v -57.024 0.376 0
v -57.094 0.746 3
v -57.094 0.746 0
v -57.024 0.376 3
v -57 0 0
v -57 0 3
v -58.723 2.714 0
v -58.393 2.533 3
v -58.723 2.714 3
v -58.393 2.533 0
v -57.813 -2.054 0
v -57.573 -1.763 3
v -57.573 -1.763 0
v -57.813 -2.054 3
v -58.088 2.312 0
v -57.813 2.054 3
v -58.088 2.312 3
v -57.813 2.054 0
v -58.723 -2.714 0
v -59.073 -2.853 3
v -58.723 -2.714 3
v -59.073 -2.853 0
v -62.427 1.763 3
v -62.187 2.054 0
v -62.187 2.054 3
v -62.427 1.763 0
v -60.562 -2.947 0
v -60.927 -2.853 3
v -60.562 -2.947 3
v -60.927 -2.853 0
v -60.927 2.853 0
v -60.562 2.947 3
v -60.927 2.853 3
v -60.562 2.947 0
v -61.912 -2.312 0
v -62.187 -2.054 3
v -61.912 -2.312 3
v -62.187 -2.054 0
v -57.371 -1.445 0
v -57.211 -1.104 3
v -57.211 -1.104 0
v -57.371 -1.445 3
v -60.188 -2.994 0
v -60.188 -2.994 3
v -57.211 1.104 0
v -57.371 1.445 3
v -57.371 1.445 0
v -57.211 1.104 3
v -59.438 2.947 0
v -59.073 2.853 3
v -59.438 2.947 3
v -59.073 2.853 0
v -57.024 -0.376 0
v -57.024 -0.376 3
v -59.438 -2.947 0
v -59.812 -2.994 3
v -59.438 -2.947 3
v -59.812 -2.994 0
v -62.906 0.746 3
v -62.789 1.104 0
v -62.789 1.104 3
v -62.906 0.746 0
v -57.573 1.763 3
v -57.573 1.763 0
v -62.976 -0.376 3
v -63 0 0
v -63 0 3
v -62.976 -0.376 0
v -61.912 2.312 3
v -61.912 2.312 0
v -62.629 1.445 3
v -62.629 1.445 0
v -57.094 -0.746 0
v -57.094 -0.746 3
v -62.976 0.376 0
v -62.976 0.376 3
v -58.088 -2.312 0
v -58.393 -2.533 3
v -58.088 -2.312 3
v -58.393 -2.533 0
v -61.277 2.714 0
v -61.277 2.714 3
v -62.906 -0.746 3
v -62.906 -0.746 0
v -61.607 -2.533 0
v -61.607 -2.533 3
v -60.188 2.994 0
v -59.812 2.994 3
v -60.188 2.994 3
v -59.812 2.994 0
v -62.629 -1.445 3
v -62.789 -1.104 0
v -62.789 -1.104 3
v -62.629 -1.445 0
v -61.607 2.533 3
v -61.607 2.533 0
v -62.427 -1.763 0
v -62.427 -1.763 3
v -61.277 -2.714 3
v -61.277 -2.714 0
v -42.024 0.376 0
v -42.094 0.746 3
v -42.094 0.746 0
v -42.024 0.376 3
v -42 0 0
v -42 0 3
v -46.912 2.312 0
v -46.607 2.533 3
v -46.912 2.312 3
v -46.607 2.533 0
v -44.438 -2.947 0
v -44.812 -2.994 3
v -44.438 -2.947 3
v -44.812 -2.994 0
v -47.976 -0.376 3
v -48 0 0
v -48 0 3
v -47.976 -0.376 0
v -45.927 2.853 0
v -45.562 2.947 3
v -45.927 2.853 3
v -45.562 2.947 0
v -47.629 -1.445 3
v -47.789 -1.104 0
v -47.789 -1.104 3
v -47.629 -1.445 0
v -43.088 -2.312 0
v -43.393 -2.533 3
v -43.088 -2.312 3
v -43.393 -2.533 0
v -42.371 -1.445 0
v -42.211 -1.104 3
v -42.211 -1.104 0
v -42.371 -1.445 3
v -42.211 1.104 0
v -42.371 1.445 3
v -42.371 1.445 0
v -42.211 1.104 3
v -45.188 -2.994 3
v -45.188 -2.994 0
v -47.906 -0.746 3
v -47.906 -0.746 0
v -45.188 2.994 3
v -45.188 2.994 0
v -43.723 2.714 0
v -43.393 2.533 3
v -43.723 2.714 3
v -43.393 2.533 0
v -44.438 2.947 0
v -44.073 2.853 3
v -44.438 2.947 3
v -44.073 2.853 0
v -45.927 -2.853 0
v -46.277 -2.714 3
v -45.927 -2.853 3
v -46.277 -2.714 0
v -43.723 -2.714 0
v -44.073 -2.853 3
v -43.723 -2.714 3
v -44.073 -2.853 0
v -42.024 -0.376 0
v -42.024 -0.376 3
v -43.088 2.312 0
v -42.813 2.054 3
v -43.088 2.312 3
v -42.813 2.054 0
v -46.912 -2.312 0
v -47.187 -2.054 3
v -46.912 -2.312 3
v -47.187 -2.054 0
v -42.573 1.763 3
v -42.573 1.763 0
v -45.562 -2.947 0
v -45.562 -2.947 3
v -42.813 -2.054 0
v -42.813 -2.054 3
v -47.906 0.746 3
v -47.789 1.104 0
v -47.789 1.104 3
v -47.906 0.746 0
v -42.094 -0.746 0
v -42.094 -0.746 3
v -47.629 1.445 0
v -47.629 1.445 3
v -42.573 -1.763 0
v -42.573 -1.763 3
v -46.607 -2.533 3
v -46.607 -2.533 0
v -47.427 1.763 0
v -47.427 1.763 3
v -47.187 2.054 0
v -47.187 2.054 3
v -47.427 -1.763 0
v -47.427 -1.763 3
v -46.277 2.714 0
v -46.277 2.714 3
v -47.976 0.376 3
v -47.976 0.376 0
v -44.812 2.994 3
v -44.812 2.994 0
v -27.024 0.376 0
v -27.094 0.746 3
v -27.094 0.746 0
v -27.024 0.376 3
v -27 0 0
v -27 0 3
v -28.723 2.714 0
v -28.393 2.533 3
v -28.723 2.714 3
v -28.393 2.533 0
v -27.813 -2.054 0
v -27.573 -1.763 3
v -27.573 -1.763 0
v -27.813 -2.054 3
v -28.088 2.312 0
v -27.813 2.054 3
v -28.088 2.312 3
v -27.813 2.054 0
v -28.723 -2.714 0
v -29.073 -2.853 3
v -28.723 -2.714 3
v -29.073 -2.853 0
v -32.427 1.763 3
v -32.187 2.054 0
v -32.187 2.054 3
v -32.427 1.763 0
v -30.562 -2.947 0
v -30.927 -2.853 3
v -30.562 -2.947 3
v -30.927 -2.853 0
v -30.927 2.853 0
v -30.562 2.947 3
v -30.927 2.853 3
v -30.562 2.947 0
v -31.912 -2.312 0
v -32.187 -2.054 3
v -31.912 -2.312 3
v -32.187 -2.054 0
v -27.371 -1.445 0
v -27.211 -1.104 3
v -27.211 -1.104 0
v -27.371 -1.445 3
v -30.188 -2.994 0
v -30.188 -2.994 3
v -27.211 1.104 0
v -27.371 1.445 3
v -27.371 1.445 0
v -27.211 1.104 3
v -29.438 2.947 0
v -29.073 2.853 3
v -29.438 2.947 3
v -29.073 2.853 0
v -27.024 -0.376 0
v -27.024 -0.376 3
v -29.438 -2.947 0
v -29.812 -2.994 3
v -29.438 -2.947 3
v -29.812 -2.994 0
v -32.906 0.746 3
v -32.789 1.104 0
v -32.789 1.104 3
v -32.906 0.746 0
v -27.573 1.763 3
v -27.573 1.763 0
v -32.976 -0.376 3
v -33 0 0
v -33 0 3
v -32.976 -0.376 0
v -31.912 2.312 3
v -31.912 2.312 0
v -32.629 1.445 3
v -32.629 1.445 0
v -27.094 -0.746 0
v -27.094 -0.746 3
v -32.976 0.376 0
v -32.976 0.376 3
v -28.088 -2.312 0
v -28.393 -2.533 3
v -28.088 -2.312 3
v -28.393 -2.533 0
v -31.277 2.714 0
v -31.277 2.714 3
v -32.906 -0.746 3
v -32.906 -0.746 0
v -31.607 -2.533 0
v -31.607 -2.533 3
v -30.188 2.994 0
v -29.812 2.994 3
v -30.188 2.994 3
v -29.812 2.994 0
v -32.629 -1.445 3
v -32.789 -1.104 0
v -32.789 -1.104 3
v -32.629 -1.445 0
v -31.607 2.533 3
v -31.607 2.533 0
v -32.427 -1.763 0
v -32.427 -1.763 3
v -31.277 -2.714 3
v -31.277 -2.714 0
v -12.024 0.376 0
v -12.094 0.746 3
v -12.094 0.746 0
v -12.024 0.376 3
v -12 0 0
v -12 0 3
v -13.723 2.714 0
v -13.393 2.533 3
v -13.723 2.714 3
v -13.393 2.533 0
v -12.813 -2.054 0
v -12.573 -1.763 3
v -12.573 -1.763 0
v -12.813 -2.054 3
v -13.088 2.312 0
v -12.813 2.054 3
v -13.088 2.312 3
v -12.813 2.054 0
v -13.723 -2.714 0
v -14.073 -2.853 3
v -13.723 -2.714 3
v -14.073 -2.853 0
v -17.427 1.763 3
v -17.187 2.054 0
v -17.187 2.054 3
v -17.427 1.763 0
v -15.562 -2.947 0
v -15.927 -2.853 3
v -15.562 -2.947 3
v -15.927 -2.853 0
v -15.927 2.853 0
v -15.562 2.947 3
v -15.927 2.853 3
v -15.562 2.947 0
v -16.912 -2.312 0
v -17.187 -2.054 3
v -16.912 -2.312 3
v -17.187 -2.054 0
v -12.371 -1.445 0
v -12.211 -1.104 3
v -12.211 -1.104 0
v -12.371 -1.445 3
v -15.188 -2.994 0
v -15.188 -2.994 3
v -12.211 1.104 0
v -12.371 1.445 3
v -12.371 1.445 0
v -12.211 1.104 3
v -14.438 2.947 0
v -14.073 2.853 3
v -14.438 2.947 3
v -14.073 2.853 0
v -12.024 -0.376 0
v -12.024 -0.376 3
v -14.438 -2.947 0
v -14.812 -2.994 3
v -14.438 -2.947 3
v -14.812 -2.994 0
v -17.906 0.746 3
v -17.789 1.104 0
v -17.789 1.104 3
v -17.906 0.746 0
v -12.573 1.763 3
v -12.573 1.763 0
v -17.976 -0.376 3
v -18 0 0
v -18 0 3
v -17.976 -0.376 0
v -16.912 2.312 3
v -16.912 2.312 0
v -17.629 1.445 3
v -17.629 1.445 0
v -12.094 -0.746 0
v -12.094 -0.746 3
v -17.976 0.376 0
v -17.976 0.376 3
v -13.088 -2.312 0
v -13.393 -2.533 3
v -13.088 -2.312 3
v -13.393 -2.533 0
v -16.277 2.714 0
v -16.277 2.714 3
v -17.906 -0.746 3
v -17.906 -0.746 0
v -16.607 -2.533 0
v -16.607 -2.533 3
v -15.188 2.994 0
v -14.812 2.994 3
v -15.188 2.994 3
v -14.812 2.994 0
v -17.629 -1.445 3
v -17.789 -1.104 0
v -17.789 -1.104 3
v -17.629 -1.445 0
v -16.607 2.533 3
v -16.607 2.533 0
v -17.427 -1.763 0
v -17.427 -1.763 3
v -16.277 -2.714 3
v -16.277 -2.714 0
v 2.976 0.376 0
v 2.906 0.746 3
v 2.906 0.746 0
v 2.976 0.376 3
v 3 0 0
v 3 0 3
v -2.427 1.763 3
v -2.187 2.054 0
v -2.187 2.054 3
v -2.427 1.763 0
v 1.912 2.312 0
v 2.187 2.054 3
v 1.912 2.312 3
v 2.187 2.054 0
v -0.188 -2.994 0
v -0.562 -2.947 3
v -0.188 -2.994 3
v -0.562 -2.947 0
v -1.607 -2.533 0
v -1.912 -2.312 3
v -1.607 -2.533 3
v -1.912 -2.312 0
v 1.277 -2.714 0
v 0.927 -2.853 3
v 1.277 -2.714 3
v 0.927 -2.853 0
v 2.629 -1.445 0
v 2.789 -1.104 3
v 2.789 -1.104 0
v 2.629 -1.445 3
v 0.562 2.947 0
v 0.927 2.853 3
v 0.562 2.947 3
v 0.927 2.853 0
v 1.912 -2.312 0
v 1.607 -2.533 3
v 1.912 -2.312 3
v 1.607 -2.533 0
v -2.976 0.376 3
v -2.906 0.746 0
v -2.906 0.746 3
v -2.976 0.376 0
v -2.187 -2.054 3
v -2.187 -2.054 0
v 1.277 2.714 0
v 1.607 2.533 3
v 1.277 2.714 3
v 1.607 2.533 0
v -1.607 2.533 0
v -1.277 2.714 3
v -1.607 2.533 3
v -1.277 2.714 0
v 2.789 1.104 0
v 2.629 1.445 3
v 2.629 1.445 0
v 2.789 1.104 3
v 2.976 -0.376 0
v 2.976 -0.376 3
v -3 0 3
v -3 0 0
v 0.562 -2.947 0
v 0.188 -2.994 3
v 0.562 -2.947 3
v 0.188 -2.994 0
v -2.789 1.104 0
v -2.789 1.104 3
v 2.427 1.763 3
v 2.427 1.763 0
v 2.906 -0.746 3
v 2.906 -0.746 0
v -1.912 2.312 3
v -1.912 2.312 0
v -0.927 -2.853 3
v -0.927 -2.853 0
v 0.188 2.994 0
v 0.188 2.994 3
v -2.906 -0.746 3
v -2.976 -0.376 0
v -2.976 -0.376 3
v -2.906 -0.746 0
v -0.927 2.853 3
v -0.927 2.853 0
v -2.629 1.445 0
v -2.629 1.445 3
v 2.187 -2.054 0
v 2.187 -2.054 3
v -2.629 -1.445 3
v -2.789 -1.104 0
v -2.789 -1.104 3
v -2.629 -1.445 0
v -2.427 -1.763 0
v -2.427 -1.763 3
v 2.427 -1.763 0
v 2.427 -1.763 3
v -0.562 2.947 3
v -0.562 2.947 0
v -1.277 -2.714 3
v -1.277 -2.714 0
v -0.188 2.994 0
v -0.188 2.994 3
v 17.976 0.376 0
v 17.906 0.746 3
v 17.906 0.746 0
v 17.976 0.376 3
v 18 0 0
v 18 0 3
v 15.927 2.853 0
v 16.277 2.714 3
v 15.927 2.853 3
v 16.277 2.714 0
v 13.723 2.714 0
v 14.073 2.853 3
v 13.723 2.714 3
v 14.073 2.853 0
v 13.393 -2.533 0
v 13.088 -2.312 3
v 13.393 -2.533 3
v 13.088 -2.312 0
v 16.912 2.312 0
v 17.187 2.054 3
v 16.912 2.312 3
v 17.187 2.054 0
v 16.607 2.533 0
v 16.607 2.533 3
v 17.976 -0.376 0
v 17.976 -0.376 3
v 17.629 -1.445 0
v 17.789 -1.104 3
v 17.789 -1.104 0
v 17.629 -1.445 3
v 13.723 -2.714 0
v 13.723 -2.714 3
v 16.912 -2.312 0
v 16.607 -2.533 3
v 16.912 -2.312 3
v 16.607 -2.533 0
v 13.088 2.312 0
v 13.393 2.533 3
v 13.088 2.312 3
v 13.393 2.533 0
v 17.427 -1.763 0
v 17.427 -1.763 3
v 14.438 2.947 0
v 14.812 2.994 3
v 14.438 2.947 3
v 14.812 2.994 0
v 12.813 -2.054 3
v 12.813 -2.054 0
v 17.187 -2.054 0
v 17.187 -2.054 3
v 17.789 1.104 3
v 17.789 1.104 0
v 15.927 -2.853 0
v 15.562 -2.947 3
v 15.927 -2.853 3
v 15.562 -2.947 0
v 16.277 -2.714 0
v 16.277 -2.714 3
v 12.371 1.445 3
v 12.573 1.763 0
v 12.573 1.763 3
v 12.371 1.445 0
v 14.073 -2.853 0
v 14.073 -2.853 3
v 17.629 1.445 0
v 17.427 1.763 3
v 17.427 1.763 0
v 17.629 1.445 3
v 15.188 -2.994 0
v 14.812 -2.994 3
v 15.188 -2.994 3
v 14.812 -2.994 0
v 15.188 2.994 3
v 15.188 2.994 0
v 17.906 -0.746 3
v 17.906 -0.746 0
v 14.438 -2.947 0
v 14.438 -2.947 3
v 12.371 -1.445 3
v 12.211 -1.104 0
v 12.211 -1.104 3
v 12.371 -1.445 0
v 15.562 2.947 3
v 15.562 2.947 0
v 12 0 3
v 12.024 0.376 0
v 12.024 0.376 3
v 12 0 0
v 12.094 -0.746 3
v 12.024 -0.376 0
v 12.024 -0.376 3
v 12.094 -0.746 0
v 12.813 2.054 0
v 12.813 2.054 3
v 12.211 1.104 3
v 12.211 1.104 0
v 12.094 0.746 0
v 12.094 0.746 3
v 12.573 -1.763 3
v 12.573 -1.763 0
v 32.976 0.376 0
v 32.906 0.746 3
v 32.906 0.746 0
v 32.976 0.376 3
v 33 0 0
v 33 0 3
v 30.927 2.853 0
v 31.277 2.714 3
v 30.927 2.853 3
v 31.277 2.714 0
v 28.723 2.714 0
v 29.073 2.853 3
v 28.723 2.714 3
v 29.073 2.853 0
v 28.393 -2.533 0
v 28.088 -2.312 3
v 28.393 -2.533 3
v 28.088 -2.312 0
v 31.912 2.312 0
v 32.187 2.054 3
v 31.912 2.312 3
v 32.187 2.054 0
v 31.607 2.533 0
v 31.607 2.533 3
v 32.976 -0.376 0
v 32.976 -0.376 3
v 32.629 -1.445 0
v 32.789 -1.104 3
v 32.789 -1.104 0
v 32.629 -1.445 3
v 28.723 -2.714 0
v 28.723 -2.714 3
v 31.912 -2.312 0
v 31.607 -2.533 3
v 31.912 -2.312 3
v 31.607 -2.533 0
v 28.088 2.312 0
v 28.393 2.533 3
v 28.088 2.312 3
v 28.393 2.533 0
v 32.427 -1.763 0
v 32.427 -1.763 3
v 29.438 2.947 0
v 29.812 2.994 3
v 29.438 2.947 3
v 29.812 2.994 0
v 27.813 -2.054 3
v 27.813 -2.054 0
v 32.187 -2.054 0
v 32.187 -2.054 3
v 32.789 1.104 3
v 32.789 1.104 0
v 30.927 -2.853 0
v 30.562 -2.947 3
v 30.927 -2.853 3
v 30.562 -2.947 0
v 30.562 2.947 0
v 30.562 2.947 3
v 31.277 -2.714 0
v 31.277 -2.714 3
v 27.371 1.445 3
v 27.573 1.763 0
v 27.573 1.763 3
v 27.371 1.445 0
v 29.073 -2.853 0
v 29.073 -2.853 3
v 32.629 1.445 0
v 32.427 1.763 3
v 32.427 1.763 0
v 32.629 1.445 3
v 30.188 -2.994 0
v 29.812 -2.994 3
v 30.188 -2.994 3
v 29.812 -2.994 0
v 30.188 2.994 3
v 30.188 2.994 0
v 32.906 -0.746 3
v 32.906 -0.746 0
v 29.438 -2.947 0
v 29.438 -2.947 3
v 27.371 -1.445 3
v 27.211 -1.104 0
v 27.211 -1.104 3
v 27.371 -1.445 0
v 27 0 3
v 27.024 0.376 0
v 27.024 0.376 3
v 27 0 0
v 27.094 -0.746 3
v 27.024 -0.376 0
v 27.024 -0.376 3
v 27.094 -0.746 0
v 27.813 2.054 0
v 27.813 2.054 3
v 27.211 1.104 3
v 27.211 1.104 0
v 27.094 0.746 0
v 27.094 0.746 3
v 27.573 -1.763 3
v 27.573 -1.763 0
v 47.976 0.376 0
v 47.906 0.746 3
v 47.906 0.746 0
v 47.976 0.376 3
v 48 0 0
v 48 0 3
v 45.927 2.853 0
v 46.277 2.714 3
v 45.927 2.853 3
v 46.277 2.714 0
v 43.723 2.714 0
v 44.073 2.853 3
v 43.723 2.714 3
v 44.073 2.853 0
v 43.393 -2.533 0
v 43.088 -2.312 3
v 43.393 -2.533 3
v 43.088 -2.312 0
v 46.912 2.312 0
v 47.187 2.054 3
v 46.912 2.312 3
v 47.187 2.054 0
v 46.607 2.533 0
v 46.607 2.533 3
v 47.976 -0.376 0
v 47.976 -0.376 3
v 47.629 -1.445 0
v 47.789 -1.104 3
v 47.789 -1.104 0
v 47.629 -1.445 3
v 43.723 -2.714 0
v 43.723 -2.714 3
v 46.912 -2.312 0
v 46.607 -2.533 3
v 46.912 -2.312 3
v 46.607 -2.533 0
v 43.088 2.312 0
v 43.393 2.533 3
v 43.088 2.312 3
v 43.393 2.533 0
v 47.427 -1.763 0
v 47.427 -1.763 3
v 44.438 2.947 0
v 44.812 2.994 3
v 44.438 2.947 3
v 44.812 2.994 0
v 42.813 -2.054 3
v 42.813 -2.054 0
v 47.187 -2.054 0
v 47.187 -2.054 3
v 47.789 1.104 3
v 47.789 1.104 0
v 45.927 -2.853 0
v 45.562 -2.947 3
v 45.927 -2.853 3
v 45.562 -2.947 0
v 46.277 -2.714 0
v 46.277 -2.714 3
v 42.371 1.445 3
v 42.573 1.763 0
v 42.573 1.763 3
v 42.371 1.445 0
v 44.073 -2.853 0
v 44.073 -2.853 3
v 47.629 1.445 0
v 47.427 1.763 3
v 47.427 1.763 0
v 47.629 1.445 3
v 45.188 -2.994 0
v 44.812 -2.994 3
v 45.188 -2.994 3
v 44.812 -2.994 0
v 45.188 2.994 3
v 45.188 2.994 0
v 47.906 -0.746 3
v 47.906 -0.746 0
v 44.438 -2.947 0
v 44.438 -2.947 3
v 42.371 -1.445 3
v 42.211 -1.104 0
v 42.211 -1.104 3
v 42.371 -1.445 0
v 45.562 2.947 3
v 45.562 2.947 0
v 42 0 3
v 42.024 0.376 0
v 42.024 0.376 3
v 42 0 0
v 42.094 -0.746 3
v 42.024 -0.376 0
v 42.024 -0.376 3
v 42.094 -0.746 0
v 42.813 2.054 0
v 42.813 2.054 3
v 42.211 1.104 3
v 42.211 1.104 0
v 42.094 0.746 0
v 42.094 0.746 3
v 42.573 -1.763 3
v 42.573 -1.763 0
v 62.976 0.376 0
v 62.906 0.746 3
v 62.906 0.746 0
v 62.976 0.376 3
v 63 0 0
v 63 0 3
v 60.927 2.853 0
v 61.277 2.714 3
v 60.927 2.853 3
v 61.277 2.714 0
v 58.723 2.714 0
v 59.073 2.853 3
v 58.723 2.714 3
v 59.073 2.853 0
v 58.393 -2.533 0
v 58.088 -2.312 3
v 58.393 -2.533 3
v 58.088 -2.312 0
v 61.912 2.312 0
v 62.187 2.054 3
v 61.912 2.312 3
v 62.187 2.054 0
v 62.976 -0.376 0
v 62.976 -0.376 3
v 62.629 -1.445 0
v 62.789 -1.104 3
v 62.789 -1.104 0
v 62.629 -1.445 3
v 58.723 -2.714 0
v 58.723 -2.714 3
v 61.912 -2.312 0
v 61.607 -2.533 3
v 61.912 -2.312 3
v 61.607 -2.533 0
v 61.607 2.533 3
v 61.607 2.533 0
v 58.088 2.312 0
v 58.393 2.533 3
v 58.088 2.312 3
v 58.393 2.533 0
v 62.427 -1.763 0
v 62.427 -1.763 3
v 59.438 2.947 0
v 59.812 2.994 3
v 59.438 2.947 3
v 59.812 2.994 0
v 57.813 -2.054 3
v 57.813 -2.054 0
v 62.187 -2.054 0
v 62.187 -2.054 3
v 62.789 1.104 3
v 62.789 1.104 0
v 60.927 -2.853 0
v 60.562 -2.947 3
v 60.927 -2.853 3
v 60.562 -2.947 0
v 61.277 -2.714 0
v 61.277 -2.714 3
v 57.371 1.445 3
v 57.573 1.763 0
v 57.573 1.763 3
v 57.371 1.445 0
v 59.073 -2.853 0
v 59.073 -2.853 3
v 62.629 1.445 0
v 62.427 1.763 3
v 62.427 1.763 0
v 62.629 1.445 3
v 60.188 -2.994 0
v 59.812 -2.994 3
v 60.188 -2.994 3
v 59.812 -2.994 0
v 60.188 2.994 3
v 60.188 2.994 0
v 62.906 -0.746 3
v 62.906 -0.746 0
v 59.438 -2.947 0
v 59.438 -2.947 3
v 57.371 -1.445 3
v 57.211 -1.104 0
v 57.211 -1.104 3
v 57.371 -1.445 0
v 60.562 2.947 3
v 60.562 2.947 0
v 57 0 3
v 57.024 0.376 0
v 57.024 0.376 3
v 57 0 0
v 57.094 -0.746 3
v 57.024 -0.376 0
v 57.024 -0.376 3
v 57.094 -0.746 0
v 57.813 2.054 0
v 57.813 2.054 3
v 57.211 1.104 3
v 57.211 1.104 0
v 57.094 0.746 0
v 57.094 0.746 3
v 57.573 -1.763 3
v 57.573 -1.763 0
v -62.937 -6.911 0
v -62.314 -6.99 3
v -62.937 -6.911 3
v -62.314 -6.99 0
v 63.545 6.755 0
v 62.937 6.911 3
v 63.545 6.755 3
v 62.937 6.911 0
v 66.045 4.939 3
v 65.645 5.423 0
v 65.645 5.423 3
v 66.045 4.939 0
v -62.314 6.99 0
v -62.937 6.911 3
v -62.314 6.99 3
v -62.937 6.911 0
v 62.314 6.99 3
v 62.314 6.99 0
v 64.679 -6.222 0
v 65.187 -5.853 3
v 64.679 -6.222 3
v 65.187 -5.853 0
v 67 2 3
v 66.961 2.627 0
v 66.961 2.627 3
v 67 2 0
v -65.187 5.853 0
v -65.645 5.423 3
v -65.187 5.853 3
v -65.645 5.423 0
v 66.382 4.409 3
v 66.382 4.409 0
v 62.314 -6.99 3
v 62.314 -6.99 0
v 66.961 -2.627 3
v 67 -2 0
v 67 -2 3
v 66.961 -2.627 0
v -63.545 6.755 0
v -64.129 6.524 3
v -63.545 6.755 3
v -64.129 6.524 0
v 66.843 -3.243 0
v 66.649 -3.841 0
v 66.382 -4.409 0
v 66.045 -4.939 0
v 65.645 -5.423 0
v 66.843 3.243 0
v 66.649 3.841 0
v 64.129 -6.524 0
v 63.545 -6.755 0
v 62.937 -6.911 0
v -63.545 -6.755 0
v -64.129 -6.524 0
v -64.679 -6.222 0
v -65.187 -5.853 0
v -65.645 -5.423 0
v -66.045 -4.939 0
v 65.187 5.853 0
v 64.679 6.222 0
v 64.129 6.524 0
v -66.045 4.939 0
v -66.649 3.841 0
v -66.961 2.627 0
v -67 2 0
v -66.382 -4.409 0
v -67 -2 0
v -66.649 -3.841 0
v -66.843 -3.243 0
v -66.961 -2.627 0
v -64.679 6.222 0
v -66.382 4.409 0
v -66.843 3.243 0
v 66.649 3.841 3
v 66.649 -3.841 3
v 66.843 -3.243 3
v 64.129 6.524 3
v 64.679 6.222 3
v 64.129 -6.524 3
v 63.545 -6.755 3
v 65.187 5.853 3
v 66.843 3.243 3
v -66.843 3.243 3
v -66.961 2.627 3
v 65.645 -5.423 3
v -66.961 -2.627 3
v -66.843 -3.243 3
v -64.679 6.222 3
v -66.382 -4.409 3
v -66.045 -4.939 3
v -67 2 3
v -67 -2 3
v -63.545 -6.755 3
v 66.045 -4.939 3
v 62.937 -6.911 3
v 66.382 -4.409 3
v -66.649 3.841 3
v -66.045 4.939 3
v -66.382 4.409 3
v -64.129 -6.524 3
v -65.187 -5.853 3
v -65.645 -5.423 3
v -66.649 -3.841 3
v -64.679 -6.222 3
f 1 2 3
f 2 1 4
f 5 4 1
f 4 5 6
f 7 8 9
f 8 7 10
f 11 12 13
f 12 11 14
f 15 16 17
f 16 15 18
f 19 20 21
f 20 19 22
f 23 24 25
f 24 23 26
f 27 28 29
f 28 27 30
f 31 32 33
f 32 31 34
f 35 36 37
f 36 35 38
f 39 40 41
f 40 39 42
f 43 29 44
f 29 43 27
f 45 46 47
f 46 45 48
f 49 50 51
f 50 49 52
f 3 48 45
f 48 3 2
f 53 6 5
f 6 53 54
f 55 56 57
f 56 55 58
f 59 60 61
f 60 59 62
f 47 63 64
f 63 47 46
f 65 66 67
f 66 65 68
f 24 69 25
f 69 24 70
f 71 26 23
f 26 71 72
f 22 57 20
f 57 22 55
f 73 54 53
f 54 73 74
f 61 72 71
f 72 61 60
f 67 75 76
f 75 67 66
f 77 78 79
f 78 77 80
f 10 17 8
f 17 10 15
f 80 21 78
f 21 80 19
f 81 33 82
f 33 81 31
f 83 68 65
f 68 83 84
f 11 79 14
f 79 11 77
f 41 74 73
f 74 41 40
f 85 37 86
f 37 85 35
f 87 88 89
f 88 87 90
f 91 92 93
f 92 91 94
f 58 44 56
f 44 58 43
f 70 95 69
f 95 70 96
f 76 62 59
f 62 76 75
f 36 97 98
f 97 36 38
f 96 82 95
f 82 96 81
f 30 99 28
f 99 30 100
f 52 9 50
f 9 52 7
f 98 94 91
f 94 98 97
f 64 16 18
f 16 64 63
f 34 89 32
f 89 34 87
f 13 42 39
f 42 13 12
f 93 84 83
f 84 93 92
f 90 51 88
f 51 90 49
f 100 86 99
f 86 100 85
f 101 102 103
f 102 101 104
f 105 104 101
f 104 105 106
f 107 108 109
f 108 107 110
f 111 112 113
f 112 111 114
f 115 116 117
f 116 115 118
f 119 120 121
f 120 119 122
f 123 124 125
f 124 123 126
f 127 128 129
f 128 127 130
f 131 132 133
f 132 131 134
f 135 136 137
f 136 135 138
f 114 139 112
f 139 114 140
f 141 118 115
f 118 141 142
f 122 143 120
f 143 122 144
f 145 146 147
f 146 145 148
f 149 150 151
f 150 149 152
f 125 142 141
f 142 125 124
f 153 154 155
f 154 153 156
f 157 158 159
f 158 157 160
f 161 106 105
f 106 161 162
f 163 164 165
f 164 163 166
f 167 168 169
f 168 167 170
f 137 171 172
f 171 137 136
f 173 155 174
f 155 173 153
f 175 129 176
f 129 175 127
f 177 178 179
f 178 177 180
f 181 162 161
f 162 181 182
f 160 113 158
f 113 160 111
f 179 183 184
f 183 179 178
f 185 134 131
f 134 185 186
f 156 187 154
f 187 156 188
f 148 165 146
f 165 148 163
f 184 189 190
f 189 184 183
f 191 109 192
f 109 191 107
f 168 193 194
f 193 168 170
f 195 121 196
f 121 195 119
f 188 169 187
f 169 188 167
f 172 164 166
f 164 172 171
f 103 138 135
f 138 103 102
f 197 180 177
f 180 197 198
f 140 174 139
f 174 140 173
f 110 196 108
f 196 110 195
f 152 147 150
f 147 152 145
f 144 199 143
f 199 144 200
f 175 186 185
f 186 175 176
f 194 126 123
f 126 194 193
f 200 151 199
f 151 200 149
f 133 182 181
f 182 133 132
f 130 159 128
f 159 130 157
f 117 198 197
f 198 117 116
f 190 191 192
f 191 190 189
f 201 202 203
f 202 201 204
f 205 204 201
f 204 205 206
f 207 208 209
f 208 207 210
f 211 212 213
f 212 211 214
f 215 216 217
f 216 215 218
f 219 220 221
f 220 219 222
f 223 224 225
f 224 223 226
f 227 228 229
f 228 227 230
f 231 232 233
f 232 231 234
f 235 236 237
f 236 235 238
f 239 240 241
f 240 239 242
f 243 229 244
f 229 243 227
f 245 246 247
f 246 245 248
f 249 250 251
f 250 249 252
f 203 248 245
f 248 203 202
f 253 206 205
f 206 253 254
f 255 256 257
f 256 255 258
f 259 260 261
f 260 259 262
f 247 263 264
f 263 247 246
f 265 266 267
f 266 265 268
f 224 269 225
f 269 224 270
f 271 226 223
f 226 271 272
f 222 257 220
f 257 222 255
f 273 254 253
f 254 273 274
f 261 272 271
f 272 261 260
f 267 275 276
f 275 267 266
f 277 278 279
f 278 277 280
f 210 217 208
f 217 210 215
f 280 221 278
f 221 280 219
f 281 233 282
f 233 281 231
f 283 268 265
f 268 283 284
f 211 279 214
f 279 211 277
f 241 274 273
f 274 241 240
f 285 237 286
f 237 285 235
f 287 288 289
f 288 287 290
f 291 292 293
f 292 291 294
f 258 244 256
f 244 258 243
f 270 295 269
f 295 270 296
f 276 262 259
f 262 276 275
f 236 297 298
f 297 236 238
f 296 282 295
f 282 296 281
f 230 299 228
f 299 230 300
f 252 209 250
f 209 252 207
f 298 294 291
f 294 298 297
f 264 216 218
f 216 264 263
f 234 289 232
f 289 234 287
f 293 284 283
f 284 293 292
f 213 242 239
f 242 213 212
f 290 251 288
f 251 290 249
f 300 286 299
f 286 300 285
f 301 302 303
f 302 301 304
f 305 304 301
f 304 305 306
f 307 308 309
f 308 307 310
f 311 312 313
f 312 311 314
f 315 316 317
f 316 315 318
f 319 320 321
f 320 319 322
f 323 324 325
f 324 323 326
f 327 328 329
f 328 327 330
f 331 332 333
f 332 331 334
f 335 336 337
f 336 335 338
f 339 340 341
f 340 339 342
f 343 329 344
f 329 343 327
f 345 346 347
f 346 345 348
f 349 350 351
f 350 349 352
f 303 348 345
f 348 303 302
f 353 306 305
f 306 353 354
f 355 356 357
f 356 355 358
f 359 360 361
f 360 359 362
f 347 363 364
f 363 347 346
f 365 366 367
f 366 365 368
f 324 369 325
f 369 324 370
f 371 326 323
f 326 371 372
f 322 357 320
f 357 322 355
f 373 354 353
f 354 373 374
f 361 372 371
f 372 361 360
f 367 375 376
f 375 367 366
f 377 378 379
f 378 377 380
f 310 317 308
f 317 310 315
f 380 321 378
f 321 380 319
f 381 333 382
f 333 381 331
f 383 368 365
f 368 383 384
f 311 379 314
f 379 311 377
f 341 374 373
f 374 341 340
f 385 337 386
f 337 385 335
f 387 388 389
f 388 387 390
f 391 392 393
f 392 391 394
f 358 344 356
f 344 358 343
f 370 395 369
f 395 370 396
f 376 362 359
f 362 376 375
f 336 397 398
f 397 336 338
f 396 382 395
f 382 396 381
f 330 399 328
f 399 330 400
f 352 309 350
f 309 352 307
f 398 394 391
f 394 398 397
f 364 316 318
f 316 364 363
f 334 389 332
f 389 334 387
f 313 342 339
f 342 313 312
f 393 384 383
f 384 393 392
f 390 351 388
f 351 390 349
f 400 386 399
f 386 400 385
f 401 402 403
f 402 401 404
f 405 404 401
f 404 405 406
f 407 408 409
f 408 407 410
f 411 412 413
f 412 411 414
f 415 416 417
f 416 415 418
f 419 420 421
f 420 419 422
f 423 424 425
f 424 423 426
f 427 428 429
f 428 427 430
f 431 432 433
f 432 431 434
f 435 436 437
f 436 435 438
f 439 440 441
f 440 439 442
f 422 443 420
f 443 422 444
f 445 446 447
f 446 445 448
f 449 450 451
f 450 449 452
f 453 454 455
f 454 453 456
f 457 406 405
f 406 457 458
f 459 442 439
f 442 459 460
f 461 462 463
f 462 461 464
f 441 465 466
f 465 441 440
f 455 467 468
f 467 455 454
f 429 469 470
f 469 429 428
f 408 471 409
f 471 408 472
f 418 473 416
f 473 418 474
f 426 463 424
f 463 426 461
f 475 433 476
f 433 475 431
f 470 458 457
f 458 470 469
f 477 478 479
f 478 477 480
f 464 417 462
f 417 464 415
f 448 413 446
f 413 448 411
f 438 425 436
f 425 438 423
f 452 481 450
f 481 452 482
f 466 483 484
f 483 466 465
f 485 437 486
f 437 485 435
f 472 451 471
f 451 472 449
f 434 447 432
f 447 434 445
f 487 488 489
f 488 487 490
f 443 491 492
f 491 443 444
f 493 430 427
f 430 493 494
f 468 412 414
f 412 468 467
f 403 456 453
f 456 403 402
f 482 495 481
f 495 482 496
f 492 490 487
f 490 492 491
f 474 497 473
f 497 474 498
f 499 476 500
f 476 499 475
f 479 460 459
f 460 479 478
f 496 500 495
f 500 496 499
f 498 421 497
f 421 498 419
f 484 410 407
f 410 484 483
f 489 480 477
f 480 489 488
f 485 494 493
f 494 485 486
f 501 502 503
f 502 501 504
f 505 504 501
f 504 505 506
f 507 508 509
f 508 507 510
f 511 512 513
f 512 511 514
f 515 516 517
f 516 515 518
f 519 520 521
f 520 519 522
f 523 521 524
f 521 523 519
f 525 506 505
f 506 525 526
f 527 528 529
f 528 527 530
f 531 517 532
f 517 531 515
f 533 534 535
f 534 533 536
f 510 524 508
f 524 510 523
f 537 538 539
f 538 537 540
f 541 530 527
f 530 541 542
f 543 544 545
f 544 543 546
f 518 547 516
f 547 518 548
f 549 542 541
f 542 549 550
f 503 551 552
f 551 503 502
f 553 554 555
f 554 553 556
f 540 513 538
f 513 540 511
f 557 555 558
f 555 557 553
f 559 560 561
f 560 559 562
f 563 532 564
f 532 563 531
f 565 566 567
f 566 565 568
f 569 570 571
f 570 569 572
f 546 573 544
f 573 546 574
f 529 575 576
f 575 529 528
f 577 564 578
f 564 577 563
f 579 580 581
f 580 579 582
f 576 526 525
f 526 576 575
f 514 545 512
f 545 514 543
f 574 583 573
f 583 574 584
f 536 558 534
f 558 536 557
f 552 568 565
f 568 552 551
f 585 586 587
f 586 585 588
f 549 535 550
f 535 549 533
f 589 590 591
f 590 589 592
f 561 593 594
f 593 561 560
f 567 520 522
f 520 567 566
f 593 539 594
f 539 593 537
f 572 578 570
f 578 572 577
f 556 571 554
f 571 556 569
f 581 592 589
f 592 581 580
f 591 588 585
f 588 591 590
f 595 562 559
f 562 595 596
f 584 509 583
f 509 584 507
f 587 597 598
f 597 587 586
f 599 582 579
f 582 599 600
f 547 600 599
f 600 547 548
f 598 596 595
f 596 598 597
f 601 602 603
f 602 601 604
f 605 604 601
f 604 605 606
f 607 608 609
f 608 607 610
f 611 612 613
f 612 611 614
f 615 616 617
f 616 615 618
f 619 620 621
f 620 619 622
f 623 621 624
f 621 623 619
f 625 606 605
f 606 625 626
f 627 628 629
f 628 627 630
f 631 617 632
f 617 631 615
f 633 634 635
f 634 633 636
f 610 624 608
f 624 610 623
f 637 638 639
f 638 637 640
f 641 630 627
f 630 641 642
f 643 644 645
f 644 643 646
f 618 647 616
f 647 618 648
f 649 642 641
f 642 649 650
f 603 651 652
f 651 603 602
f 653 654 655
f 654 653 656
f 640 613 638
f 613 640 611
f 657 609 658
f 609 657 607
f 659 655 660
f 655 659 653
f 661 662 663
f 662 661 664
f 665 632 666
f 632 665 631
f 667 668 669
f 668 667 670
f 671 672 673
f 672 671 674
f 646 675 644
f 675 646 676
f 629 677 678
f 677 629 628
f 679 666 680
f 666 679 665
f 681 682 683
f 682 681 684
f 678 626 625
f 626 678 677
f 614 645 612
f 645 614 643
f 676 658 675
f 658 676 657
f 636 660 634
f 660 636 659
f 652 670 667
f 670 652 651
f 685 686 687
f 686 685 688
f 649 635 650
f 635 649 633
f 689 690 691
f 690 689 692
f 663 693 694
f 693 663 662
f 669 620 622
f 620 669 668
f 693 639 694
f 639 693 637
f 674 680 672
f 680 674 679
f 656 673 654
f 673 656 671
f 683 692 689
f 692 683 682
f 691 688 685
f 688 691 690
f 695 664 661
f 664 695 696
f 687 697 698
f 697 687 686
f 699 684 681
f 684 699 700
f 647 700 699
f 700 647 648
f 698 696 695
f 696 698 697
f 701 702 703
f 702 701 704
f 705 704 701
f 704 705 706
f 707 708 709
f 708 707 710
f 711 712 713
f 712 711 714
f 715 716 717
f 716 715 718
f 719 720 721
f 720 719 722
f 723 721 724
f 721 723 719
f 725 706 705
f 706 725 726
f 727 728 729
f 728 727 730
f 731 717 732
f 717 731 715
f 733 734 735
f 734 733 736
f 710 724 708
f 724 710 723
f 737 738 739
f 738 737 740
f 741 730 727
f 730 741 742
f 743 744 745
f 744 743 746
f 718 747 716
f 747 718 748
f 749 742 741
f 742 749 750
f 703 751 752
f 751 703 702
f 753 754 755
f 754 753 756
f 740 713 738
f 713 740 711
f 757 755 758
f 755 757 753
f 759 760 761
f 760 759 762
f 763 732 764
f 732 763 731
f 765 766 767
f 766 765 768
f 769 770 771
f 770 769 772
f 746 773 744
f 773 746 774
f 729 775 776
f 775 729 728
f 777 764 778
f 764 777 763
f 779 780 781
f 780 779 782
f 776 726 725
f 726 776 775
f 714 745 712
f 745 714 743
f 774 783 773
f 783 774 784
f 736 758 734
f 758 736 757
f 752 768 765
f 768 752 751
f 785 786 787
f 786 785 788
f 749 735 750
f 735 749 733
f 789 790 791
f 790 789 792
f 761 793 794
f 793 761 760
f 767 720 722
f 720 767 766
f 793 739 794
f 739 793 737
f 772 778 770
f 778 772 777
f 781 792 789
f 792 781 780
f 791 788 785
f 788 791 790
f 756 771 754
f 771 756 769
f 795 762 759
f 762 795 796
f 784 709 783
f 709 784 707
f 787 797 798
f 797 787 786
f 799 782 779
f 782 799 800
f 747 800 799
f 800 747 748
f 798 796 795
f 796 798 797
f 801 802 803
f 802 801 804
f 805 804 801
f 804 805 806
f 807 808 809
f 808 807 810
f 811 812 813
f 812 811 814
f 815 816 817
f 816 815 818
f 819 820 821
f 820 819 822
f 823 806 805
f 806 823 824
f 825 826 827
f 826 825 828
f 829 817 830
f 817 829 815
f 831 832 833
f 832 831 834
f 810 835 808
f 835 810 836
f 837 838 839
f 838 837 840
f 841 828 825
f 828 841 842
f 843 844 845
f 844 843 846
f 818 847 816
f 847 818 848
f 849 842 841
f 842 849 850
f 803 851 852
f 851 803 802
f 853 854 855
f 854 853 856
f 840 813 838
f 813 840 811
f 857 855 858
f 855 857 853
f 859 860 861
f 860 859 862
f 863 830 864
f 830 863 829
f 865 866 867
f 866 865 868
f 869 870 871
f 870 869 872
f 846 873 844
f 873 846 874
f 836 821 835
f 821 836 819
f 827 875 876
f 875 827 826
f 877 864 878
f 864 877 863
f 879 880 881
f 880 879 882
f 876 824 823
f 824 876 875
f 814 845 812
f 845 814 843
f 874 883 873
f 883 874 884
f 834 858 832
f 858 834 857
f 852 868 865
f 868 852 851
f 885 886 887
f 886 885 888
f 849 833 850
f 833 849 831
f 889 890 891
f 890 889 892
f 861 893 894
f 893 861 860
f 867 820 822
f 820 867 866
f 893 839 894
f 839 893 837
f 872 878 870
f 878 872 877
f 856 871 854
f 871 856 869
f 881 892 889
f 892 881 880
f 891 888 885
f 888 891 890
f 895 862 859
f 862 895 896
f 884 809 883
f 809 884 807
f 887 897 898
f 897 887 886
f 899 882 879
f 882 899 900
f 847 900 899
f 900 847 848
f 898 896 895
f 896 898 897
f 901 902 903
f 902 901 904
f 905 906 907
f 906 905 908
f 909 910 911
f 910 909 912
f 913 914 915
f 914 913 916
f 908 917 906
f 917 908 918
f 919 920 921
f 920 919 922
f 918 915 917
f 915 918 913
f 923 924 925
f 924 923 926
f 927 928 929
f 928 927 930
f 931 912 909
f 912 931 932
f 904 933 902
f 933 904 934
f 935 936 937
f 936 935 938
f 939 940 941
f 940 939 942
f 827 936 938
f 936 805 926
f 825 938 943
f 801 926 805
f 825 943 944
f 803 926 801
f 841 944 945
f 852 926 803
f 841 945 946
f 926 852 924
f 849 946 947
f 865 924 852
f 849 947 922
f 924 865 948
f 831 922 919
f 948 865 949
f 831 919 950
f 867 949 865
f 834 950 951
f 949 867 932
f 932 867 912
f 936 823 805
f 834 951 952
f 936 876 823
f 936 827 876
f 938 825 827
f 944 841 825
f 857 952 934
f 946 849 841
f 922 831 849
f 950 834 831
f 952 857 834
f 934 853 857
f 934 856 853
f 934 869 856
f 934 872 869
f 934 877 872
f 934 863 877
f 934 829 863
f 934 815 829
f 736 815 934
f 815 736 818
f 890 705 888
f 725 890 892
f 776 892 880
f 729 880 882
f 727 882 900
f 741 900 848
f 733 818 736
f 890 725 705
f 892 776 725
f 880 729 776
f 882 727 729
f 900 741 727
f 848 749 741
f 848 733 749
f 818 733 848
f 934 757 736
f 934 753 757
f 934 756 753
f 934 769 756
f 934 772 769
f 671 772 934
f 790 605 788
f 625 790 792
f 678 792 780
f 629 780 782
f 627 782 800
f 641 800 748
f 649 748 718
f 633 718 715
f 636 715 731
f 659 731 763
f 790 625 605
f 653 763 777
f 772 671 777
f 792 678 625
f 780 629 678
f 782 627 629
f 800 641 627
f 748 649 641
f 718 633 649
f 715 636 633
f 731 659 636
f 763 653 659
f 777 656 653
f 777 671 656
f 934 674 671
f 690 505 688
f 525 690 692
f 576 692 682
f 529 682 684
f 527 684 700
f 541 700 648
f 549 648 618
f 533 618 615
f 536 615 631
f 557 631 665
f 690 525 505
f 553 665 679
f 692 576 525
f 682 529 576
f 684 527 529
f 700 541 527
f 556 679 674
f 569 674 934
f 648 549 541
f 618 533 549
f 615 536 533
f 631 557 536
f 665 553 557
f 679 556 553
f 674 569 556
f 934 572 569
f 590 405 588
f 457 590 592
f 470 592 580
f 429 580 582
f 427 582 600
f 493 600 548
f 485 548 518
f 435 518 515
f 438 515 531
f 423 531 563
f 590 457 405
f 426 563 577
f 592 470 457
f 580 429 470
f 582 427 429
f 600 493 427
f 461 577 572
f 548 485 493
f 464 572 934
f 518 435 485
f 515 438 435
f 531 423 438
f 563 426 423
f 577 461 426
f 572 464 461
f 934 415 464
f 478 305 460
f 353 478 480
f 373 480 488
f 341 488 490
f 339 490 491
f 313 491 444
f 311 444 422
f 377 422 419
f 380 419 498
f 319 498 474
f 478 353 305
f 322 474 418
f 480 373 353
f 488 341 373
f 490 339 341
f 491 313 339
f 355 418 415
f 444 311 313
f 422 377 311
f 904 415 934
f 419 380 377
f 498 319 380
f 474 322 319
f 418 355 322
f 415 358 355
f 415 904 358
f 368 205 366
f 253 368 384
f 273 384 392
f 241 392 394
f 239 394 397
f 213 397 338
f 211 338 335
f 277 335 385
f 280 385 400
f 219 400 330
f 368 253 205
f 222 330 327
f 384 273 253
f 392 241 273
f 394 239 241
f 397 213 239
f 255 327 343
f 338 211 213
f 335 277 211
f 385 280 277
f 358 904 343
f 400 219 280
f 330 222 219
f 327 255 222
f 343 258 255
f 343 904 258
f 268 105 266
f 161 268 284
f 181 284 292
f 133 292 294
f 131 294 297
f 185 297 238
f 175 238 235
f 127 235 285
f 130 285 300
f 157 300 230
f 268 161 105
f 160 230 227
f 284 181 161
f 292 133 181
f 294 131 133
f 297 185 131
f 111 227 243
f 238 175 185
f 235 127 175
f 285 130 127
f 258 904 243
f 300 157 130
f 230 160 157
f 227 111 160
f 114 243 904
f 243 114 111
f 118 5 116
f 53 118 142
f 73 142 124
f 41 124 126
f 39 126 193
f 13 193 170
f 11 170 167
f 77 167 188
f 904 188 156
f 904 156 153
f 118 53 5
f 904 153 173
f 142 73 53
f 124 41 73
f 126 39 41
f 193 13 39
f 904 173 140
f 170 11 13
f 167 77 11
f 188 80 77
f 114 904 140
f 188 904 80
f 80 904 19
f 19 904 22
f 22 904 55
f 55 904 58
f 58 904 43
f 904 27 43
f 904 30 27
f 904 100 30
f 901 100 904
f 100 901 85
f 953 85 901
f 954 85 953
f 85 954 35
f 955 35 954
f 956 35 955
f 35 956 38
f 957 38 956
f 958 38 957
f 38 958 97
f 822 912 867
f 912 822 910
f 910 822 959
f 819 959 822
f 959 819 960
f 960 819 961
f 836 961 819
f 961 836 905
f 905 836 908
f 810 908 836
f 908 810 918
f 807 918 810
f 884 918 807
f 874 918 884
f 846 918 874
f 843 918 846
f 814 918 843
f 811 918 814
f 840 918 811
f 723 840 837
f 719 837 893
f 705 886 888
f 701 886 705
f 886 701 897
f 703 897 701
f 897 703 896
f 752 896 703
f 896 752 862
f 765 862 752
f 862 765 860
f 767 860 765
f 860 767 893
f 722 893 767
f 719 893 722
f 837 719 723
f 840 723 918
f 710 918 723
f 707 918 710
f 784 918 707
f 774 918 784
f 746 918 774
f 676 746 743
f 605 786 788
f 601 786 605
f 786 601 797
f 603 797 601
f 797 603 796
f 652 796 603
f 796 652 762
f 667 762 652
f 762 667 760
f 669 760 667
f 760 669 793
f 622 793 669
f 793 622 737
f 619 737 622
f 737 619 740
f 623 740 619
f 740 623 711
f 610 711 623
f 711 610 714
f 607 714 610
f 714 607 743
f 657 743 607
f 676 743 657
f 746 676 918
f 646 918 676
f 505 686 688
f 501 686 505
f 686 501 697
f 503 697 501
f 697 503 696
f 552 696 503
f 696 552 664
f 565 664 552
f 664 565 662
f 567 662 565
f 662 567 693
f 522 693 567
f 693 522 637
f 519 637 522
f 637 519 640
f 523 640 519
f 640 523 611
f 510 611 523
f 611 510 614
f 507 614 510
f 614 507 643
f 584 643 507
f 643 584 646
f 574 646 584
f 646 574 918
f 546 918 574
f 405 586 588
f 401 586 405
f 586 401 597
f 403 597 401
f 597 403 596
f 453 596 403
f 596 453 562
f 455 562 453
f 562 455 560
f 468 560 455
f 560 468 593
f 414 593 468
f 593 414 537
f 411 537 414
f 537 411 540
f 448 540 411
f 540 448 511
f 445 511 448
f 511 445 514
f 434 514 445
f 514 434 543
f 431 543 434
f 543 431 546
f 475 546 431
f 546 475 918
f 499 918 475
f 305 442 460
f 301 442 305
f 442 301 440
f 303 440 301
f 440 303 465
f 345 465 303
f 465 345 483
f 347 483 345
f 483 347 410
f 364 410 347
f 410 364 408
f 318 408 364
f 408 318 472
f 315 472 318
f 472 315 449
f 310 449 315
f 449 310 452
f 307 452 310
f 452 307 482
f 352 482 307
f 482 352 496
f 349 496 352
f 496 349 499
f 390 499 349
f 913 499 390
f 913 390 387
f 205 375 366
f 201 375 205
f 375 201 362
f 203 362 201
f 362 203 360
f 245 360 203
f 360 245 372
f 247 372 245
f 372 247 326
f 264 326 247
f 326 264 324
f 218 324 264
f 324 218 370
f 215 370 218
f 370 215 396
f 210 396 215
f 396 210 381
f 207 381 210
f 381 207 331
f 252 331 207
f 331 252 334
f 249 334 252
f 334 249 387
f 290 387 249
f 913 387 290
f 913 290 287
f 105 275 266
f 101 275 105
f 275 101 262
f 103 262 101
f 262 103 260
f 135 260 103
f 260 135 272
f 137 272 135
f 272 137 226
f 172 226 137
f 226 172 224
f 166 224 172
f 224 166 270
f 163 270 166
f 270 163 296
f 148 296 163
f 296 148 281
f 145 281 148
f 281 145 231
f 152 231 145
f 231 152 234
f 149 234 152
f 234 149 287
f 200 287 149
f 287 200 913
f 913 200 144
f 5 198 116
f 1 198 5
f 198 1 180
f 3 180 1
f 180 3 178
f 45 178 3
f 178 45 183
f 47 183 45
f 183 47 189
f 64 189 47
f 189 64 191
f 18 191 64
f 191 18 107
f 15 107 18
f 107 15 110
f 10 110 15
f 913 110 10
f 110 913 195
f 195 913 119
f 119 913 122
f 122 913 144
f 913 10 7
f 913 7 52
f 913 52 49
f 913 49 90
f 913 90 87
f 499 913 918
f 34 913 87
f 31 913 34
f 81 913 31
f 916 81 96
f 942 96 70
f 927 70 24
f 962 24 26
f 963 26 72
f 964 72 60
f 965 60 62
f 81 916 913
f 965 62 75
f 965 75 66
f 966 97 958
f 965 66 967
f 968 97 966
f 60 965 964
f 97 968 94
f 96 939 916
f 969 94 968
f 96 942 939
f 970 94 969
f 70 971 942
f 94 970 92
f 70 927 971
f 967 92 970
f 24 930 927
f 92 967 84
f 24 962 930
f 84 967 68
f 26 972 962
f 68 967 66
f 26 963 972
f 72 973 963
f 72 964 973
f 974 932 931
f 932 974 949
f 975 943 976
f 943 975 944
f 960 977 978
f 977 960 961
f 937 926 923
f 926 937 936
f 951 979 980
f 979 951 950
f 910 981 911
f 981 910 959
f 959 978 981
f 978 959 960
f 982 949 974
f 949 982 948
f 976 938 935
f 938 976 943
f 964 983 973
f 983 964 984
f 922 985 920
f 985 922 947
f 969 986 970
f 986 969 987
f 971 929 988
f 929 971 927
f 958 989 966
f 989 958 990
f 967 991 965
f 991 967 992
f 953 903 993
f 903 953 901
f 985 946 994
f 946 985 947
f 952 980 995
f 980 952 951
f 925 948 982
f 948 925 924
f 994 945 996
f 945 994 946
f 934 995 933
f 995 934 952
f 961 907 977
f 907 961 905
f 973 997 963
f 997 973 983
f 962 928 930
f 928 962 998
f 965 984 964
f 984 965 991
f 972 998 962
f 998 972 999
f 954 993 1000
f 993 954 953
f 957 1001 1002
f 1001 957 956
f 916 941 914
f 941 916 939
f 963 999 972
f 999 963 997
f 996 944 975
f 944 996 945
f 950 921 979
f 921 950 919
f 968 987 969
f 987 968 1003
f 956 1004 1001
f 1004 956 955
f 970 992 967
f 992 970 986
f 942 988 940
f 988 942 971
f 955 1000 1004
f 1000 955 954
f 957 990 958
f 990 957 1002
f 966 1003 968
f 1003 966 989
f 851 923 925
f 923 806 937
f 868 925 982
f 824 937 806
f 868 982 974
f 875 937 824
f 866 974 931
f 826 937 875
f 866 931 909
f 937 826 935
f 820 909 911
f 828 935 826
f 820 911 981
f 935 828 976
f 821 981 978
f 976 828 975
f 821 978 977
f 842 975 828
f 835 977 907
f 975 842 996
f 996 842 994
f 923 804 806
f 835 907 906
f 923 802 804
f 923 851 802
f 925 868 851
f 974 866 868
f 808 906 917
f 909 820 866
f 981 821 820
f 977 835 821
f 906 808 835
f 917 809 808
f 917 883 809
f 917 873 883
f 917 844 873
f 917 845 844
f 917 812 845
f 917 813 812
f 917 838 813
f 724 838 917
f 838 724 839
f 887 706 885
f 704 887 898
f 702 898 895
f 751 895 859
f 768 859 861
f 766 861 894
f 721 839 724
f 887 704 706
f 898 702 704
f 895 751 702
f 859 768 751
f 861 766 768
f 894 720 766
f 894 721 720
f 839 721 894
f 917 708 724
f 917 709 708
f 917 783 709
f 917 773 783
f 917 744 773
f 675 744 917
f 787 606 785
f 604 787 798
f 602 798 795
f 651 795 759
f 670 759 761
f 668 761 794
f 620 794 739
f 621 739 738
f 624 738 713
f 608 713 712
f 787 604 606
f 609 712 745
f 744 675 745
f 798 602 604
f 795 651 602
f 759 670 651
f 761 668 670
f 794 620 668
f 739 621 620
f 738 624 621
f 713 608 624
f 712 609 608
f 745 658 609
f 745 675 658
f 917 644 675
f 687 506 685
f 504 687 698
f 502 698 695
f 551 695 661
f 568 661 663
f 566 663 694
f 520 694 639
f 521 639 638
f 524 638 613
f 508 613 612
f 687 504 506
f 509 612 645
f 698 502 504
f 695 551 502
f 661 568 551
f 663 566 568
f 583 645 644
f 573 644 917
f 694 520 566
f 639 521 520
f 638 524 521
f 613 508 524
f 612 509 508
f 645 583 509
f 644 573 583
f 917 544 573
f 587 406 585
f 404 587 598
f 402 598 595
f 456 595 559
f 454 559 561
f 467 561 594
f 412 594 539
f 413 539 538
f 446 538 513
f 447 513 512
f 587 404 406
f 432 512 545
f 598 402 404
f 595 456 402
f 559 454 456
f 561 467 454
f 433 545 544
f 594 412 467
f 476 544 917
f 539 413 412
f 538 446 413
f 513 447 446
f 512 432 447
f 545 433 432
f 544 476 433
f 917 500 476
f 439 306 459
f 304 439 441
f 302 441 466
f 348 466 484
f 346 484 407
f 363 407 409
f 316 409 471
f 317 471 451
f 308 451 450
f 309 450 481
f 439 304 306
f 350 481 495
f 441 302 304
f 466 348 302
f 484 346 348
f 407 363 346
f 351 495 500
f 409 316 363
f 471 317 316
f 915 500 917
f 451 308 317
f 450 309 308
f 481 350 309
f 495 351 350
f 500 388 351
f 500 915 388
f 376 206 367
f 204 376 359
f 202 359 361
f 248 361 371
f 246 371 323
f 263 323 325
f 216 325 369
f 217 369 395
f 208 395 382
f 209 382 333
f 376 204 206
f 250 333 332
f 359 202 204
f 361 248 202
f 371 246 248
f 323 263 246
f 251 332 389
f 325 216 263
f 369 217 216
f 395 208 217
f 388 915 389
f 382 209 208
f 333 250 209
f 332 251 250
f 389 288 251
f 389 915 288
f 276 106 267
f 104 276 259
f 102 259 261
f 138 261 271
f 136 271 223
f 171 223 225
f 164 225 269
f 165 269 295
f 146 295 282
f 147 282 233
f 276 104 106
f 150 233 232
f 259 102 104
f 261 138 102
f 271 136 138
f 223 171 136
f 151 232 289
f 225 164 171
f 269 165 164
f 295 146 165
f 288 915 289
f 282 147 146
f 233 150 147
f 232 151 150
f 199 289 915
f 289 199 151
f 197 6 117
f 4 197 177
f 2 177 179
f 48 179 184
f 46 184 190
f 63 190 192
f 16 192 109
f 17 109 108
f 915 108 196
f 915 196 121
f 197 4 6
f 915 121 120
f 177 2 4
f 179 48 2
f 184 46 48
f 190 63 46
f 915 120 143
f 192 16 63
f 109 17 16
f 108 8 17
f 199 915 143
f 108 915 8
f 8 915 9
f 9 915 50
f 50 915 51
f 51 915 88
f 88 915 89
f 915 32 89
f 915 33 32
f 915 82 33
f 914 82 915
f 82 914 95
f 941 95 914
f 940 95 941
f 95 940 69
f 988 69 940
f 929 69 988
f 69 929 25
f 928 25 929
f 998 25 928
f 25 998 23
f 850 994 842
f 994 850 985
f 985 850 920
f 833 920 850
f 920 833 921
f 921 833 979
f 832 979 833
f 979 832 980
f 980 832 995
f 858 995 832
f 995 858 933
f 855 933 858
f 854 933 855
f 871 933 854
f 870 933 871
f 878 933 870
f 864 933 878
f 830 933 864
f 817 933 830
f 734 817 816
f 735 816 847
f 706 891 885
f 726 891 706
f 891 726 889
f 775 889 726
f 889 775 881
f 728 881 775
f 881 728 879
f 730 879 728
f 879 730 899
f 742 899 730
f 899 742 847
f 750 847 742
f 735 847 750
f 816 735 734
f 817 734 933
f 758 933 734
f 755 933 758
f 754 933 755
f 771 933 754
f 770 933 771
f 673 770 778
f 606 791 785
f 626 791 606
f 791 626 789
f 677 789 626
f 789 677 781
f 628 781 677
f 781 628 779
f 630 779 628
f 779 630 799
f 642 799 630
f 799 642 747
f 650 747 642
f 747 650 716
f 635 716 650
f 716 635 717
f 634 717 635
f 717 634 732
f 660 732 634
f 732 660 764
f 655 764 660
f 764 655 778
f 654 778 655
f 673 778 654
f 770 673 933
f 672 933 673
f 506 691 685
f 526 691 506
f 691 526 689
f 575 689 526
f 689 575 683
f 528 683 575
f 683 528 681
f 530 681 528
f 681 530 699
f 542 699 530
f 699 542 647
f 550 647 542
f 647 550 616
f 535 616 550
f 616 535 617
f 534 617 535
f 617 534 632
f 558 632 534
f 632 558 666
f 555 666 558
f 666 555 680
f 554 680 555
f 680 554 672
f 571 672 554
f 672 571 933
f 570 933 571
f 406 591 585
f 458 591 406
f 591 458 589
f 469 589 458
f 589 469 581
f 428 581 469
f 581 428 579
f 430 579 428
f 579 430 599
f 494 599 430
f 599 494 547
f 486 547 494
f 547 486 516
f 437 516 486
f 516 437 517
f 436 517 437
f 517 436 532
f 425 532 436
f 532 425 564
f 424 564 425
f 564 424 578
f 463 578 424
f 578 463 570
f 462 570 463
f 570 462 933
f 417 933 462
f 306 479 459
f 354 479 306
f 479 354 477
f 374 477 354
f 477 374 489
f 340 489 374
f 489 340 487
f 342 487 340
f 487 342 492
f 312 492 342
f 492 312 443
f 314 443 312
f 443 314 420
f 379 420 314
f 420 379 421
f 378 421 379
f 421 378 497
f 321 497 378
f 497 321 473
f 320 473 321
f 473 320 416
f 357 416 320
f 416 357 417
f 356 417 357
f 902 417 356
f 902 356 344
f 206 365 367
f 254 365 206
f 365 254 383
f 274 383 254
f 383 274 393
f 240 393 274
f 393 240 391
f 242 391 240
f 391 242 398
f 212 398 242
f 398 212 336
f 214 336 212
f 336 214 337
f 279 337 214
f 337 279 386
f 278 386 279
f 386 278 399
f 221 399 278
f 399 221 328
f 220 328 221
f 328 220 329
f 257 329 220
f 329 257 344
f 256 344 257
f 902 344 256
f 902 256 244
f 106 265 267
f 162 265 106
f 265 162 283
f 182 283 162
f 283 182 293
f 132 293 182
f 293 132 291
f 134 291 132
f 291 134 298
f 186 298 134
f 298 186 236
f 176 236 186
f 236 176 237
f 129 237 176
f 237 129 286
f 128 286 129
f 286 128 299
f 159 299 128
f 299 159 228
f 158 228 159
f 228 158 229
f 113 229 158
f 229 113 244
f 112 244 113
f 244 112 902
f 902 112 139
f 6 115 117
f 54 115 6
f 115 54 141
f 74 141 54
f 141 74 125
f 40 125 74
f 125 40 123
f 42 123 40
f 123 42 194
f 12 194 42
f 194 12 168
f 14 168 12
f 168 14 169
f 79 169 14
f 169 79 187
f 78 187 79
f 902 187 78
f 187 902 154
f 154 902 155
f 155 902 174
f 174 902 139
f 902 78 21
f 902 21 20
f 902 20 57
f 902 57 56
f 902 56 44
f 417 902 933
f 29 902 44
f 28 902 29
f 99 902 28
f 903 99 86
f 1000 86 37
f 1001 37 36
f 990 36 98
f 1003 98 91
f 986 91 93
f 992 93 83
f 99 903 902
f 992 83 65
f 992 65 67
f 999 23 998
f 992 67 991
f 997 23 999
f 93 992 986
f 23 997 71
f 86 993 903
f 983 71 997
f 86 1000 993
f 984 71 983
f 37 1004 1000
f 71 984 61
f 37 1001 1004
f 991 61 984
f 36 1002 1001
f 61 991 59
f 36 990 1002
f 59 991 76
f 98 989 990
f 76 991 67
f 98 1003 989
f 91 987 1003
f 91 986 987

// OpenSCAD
$fn = 50;


difference() {
	union() {
		hull() {
			translate(v = [-62.0000000000, 2.0000000000, 0]) {
				cylinder(h = 3, r = 5);
			}
			translate(v = [62.0000000000, 2.0000000000, 0]) {
				cylinder(h = 3, r = 5);
			}
			translate(v = [-62.0000000000, -2.0000000000, 0]) {
				cylinder(h = 3, r = 5);
			}
			translate(v = [62.0000000000, -2.0000000000, 0]) {
				cylinder(h = 3, r = 5);
			}
		}
	}
	union() {
		translate(v = [-60.0000000000, 0.0000000000, 0]) {
			translate(v = [0, 0, -100]) {
				cylinder(h = 200, r = 3.0000000000);
			}
		}
		translate(v = [-45.0000000000, 0.0000000000, 0]) {
			translate(v = [0, 0, -100]) {
				cylinder(h = 200, r = 3.0000000000);
			}
		}
		translate(v = [-30.0000000000, 0.0000000000, 0]) {
			translate(v = [0, 0, -100]) {
				cylinder(h = 200, r = 3.0000000000);
			}
		}
		translate(v = [-15.0000000000, 0.0000000000, 0]) {
			translate(v = [0, 0, -100]) {
				cylinder(h = 200, r = 3.0000000000);
			}
		}
		translate(v = [0, 0, -100]) {
			cylinder(h = 200, r = 3.0000000000);
		}
		translate(v = [15.0000000000, 0.0000000000, 0]) {
			translate(v = [0, 0, -100]) {
				cylinder(h = 200, r = 3.0000000000);
			}
		}
		translate(v = [30.0000000000, 0.0000000000, 0]) {
			translate(v = [0, 0, -100]) {
				cylinder(h = 200, r = 3.0000000000);
			}
		}
		translate(v = [45.0000000000, 0.0000000000, 0]) {
			translate(v = [0, 0, -100]) {
				cylinder(h = 200, r = 3.0000000000);
			}
		}
		translate(v = [60.0000000000, 0.0000000000, 0]) {
			translate(v = [0, 0, -100]) {
				cylinder(h = 200, r = 3.0000000000);
			}
		}
	}
}
